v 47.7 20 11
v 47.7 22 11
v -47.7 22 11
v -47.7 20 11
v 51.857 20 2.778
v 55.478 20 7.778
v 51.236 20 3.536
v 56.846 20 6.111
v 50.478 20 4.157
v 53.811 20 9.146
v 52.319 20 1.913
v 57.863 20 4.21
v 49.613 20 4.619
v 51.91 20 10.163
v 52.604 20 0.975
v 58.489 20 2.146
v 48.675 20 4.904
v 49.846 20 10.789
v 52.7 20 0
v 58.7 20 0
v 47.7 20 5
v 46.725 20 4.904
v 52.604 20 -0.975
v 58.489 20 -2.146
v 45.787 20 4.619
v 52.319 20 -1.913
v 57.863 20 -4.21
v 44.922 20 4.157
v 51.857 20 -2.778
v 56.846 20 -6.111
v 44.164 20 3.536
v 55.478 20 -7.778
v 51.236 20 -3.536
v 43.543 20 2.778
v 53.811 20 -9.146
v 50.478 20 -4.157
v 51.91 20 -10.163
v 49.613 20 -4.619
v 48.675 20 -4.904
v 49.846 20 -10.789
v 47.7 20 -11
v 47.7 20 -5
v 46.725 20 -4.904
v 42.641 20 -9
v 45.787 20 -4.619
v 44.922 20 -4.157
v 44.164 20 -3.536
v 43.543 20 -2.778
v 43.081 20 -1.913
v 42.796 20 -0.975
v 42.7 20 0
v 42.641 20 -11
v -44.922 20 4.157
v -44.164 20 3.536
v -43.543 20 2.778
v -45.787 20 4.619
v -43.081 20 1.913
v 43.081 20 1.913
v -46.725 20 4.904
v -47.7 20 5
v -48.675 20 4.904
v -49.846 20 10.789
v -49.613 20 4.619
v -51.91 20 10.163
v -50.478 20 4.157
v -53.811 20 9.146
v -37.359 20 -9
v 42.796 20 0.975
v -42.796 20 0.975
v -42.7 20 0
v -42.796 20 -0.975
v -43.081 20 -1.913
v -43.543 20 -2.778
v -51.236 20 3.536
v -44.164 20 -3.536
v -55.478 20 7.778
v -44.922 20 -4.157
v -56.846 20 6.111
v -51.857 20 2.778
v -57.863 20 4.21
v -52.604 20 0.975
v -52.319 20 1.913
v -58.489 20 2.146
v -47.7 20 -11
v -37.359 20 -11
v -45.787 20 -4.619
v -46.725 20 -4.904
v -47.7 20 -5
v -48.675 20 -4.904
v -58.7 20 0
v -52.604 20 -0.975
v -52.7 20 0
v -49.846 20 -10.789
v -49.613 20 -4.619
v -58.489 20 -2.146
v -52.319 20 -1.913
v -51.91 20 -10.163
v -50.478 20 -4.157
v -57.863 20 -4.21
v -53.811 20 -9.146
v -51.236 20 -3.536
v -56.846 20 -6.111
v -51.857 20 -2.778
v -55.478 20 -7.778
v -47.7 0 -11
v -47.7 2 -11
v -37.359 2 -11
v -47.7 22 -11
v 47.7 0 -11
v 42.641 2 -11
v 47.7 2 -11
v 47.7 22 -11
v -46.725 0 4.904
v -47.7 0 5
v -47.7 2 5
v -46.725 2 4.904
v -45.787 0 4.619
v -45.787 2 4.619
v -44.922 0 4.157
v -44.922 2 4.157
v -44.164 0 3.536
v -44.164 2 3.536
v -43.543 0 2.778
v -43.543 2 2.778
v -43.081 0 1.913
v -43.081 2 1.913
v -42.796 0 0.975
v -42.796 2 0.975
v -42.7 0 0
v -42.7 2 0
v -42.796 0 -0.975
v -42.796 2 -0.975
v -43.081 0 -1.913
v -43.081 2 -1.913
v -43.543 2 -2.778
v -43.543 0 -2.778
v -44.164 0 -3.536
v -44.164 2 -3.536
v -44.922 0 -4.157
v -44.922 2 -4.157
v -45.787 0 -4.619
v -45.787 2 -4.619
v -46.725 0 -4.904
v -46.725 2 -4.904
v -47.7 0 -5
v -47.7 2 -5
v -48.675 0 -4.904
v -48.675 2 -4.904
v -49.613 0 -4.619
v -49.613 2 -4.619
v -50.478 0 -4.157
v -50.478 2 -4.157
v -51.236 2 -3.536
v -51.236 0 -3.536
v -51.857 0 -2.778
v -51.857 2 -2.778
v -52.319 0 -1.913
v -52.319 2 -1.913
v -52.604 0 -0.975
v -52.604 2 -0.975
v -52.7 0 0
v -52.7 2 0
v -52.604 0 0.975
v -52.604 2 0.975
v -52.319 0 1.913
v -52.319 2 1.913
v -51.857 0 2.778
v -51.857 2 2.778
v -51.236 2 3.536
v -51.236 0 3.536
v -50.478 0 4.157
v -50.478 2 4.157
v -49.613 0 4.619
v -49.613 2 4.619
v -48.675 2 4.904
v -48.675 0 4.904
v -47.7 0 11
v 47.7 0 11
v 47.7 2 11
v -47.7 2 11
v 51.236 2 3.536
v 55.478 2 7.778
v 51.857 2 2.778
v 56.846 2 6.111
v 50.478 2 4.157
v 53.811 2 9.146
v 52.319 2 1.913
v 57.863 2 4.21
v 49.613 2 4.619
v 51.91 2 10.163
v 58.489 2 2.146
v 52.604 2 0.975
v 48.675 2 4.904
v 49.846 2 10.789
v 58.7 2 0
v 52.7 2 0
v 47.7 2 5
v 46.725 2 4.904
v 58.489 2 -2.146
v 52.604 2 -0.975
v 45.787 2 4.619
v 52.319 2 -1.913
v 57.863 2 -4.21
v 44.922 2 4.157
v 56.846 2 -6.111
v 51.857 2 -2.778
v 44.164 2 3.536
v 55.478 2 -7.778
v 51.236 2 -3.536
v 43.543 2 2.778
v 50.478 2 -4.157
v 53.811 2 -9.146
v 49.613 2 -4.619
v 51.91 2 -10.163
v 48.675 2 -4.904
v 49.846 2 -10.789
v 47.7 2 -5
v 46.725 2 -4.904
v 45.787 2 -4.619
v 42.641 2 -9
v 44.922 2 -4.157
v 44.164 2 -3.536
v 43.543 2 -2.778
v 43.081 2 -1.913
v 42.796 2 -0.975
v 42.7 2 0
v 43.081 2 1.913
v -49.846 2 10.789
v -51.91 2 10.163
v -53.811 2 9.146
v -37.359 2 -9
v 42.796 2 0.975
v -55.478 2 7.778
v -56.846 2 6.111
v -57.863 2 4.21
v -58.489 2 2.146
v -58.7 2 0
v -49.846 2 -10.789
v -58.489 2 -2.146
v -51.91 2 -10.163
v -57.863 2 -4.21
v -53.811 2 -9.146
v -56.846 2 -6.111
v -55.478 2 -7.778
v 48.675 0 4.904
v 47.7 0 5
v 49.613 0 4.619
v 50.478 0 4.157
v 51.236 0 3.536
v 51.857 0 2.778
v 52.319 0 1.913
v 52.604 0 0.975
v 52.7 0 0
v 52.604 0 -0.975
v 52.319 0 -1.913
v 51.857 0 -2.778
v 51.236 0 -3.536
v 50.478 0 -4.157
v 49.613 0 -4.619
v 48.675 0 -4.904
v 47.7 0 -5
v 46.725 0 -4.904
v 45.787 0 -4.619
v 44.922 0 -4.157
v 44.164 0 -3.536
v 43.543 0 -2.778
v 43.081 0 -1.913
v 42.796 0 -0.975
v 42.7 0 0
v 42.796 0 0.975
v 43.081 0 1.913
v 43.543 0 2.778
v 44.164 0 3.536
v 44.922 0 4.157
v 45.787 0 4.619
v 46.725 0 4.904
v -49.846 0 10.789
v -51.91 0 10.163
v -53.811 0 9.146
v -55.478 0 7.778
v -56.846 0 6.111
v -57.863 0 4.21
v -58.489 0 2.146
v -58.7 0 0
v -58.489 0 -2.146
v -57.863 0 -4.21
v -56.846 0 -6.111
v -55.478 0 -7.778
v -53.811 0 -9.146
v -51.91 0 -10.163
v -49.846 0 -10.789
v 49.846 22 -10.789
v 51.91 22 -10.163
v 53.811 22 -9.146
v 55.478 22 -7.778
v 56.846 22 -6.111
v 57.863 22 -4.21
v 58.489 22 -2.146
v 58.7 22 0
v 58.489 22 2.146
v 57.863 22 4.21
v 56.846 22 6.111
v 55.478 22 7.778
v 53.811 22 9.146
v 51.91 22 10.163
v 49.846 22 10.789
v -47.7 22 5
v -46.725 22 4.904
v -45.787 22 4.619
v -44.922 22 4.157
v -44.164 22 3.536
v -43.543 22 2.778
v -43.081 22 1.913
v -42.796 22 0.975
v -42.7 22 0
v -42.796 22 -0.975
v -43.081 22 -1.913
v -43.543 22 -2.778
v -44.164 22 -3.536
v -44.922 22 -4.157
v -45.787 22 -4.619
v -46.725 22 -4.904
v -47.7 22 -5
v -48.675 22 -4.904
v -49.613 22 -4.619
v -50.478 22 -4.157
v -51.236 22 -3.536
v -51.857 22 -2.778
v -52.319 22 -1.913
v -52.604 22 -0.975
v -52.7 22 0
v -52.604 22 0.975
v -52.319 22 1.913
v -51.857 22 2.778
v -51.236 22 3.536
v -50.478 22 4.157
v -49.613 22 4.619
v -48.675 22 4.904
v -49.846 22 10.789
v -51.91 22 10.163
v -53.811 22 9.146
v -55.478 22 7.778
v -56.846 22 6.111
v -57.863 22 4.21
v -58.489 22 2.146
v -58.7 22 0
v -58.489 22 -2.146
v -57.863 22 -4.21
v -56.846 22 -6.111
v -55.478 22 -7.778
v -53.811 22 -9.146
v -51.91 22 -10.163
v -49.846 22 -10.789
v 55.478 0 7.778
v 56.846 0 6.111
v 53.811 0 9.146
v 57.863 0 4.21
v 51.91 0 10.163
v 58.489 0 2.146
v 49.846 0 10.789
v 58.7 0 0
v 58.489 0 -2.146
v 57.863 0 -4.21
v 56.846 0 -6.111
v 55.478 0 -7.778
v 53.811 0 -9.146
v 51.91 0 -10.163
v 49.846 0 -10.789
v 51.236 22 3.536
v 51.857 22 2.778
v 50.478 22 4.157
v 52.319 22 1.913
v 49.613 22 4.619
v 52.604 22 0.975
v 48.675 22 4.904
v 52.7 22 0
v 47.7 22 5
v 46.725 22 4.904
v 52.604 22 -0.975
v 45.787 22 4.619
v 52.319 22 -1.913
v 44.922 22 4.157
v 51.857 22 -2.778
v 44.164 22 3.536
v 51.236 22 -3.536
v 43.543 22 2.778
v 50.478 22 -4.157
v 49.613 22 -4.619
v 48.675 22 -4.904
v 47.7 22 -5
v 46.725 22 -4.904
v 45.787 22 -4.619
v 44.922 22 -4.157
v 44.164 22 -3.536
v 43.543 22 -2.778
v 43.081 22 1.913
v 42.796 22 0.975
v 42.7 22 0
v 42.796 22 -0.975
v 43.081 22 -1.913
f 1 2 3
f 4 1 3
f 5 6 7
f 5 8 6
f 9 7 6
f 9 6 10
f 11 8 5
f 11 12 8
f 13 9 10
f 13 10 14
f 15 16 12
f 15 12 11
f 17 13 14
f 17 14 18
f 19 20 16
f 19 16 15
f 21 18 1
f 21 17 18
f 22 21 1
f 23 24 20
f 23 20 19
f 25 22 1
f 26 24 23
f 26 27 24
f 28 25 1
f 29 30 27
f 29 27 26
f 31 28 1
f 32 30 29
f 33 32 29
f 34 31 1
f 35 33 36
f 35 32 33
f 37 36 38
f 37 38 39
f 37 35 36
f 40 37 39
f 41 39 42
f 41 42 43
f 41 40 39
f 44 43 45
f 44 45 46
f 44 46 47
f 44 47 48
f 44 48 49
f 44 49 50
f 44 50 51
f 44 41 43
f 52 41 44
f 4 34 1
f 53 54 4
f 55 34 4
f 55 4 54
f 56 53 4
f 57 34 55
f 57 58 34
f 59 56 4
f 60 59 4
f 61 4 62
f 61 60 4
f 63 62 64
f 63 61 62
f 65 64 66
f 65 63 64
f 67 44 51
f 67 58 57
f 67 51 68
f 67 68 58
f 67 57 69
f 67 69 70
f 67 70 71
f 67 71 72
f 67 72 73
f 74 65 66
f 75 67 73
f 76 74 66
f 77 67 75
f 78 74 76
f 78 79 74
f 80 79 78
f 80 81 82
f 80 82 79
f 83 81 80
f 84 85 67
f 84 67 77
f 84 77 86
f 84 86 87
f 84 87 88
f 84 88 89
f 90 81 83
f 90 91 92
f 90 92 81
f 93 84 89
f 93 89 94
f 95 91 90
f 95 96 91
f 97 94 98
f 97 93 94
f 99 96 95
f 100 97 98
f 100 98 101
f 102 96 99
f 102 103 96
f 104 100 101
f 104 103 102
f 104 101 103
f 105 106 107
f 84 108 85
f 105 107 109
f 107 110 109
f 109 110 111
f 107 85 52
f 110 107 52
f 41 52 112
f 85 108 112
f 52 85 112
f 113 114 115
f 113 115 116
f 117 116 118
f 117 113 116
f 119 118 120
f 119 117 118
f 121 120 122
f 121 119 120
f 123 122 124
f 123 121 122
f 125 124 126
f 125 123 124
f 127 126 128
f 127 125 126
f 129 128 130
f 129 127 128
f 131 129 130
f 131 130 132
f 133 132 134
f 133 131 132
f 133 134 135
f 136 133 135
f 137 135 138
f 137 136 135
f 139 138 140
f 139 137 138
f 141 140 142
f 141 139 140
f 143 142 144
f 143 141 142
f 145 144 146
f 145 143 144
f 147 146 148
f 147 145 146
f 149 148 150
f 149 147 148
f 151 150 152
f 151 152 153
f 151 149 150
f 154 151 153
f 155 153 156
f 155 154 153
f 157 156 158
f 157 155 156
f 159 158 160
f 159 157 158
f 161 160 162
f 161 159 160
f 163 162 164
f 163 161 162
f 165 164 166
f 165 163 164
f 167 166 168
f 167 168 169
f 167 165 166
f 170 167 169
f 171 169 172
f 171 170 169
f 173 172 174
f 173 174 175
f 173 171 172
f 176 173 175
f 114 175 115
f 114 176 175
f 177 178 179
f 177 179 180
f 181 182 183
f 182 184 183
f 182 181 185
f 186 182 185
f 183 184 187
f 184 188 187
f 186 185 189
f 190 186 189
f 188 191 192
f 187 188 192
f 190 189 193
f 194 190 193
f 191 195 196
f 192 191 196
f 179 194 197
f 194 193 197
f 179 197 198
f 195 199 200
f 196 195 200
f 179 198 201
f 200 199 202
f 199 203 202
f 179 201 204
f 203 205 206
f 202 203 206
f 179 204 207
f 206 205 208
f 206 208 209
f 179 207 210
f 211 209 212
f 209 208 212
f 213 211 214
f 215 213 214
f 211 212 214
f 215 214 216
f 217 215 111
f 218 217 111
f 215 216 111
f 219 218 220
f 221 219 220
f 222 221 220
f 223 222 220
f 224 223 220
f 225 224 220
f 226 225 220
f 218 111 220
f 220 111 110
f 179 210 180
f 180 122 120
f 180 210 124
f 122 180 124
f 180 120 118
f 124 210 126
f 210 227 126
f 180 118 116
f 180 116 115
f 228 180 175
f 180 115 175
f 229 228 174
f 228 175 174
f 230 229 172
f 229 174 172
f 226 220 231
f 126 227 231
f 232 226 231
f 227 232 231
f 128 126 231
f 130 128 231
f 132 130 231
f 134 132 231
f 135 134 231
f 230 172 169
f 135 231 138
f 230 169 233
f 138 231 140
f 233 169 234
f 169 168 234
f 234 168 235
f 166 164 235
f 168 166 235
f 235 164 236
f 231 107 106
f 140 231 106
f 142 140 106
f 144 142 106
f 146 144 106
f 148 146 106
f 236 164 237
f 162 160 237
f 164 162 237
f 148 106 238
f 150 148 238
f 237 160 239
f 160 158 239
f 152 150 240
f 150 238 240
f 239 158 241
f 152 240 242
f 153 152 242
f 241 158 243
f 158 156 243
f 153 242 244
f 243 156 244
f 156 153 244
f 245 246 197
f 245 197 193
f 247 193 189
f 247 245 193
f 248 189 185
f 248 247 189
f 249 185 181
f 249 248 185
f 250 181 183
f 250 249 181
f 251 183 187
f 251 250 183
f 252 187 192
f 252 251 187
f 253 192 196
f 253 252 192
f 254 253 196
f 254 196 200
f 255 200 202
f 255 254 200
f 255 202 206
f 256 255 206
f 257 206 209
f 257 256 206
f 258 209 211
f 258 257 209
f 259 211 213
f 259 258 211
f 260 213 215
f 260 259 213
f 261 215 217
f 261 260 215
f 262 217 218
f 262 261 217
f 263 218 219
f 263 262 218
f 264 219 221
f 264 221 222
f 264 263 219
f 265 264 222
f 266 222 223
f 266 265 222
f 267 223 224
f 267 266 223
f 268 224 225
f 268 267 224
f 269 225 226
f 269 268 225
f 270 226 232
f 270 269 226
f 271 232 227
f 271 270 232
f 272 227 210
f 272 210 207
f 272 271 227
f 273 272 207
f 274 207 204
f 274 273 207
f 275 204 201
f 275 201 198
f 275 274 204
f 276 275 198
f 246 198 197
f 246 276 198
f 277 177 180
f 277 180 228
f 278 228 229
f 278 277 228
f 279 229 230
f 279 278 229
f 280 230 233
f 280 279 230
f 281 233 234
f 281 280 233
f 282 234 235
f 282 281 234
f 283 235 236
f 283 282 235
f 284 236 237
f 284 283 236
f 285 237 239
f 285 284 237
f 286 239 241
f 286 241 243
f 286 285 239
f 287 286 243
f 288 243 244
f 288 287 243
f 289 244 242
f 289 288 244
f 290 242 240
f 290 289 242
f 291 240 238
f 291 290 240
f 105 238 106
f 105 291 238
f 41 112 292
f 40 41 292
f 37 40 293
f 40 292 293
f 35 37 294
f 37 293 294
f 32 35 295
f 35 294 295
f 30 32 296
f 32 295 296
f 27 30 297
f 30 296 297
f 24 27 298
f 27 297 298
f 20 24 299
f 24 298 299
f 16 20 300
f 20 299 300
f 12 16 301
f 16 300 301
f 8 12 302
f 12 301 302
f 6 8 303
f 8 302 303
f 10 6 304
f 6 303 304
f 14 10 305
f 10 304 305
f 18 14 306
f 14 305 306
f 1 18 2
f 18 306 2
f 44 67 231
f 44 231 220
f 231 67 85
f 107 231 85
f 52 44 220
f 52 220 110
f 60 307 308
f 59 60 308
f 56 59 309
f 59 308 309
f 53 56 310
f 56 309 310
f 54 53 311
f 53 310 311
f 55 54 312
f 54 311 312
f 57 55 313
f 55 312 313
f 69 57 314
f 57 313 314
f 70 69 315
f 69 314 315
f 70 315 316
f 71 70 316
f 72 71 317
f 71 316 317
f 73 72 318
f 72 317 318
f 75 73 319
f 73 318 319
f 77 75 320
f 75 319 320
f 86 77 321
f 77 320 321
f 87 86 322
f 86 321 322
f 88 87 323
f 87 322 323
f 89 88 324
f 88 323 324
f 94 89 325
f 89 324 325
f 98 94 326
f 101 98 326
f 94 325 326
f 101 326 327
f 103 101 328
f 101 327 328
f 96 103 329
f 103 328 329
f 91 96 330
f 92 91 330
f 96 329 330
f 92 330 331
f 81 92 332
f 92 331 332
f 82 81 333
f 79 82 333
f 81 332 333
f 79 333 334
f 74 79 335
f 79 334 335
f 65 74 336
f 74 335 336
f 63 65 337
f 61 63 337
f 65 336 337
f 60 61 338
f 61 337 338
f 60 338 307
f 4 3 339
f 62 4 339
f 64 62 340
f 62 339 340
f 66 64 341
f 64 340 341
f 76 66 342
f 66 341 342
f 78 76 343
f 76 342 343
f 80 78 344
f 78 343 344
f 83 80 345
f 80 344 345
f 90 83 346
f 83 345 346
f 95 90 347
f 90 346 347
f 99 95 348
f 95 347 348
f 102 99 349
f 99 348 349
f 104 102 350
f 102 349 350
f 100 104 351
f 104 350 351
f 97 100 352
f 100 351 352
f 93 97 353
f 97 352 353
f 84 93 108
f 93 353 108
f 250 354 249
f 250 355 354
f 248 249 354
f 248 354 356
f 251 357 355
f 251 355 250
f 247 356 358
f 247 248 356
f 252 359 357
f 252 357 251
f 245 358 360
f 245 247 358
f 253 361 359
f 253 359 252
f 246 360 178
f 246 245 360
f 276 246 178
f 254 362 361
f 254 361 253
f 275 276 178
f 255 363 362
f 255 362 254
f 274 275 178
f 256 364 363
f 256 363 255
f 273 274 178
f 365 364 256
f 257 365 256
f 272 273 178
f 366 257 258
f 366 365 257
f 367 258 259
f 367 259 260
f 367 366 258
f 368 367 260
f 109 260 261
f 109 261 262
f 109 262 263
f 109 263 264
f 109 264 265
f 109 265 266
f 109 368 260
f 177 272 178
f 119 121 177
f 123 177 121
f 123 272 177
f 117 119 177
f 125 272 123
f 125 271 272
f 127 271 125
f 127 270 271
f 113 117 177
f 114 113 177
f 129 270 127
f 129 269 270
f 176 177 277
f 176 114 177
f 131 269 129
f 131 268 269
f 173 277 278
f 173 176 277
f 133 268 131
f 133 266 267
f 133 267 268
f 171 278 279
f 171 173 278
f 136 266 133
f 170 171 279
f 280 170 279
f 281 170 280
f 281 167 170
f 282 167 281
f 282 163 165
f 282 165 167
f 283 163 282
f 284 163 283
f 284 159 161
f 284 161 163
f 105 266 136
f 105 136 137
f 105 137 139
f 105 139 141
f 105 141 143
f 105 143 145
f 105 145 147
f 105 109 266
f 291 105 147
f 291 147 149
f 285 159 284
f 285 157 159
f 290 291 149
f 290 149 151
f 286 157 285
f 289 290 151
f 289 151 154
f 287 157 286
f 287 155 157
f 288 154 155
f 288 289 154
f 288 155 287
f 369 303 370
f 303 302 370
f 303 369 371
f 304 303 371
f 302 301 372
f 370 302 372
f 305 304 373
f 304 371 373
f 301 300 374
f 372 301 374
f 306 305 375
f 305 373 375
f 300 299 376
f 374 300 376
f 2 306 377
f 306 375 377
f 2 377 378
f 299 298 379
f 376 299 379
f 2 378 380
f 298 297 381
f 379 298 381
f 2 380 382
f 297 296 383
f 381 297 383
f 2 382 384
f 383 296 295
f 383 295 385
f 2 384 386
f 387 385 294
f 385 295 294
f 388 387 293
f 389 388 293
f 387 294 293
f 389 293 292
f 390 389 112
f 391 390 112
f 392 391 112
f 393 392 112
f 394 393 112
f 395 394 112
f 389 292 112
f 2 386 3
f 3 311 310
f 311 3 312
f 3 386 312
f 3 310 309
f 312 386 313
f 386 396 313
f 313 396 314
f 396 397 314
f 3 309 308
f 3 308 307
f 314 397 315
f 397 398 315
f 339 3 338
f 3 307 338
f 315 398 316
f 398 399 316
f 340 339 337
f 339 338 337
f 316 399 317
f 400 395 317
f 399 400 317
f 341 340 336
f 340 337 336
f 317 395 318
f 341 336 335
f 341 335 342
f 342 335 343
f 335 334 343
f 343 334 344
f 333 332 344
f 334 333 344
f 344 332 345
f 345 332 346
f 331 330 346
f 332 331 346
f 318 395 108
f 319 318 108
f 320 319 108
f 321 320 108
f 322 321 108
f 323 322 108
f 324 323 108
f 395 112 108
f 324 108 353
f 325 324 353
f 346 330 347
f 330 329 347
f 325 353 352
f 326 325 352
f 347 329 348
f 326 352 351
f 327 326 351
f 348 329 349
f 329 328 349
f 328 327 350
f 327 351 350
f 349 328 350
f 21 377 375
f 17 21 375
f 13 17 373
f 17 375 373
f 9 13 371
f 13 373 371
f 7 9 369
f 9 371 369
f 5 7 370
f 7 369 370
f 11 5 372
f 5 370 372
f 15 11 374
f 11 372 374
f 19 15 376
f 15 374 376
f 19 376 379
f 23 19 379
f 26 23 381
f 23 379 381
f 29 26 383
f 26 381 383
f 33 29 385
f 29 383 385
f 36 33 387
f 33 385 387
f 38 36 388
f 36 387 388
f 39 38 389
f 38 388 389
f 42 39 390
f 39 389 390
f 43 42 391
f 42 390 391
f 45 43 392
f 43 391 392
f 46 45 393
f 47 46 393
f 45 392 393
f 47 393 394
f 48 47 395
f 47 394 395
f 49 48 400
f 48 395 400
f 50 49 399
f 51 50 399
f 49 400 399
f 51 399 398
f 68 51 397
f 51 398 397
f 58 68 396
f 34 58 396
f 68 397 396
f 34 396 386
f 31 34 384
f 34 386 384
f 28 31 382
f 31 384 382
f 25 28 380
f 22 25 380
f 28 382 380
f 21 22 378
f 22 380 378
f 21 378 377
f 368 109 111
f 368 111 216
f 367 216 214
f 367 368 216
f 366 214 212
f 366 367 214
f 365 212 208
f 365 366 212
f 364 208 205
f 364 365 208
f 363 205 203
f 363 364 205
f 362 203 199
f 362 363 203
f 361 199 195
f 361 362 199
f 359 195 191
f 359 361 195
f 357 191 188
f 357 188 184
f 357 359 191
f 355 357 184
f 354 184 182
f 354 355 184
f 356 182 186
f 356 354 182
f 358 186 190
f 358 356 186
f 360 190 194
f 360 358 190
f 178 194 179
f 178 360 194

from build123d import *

# Parameters (mm, degrees)
SKETCH1_R           = 5
BOSS_EXTRUDE1_DEPTH = 2
SKETCH2_W           = 80
SKETCH2_H           = 2
BOSS_EXTRUDE2_DEPTH = 9


with BuildPart() as part:
    # Sketch1 → Boss-Extrude1 (new body)
    with BuildSketch(Plane(origin=(0, 0, 0), x_dir=(1, 0, 0), z_dir=(0, 1, 0))):
        with BuildLine():
            Line((-47.7, 11), (47.7, 11))
            ThreePointArc((47.7, 11), (58.7, 0), (47.7, -11))
            Line((47.7, -11), (-47.7, -11))
            ThreePointArc((-47.7, -11), (-58.7, 0), (-47.7, 11))
        make_face()
        with Locations(Location((47.7, 0, 0), (0, 0, 270))):
            Circle(SKETCH1_R, mode=Mode.SUBTRACT)
        with Locations(Location((-47.7, 0, 0), (0, 0, 270))):
            Circle(SKETCH1_R, mode=Mode.SUBTRACT)
    extrude(amount=BOSS_EXTRUDE1_DEPTH)

    # Sketch2 → Boss-Extrude2 (add)
    with BuildSketch(Plane(origin=(0, 2, 0), x_dir=(1, 0, 0), z_dir=(0, 1, 0))):
        with Locations((2.64092049, 10)):
            Rectangle(SKETCH2_W, SKETCH2_H)
    extrude(amount=BOSS_EXTRUDE2_DEPTH)

    # Mirror1: part across plane


with BuildPart() as part_1:
    add(part.part)
    add(part.part.mirror(Plane.ZX.offset(11)))


solid = part_1.part
